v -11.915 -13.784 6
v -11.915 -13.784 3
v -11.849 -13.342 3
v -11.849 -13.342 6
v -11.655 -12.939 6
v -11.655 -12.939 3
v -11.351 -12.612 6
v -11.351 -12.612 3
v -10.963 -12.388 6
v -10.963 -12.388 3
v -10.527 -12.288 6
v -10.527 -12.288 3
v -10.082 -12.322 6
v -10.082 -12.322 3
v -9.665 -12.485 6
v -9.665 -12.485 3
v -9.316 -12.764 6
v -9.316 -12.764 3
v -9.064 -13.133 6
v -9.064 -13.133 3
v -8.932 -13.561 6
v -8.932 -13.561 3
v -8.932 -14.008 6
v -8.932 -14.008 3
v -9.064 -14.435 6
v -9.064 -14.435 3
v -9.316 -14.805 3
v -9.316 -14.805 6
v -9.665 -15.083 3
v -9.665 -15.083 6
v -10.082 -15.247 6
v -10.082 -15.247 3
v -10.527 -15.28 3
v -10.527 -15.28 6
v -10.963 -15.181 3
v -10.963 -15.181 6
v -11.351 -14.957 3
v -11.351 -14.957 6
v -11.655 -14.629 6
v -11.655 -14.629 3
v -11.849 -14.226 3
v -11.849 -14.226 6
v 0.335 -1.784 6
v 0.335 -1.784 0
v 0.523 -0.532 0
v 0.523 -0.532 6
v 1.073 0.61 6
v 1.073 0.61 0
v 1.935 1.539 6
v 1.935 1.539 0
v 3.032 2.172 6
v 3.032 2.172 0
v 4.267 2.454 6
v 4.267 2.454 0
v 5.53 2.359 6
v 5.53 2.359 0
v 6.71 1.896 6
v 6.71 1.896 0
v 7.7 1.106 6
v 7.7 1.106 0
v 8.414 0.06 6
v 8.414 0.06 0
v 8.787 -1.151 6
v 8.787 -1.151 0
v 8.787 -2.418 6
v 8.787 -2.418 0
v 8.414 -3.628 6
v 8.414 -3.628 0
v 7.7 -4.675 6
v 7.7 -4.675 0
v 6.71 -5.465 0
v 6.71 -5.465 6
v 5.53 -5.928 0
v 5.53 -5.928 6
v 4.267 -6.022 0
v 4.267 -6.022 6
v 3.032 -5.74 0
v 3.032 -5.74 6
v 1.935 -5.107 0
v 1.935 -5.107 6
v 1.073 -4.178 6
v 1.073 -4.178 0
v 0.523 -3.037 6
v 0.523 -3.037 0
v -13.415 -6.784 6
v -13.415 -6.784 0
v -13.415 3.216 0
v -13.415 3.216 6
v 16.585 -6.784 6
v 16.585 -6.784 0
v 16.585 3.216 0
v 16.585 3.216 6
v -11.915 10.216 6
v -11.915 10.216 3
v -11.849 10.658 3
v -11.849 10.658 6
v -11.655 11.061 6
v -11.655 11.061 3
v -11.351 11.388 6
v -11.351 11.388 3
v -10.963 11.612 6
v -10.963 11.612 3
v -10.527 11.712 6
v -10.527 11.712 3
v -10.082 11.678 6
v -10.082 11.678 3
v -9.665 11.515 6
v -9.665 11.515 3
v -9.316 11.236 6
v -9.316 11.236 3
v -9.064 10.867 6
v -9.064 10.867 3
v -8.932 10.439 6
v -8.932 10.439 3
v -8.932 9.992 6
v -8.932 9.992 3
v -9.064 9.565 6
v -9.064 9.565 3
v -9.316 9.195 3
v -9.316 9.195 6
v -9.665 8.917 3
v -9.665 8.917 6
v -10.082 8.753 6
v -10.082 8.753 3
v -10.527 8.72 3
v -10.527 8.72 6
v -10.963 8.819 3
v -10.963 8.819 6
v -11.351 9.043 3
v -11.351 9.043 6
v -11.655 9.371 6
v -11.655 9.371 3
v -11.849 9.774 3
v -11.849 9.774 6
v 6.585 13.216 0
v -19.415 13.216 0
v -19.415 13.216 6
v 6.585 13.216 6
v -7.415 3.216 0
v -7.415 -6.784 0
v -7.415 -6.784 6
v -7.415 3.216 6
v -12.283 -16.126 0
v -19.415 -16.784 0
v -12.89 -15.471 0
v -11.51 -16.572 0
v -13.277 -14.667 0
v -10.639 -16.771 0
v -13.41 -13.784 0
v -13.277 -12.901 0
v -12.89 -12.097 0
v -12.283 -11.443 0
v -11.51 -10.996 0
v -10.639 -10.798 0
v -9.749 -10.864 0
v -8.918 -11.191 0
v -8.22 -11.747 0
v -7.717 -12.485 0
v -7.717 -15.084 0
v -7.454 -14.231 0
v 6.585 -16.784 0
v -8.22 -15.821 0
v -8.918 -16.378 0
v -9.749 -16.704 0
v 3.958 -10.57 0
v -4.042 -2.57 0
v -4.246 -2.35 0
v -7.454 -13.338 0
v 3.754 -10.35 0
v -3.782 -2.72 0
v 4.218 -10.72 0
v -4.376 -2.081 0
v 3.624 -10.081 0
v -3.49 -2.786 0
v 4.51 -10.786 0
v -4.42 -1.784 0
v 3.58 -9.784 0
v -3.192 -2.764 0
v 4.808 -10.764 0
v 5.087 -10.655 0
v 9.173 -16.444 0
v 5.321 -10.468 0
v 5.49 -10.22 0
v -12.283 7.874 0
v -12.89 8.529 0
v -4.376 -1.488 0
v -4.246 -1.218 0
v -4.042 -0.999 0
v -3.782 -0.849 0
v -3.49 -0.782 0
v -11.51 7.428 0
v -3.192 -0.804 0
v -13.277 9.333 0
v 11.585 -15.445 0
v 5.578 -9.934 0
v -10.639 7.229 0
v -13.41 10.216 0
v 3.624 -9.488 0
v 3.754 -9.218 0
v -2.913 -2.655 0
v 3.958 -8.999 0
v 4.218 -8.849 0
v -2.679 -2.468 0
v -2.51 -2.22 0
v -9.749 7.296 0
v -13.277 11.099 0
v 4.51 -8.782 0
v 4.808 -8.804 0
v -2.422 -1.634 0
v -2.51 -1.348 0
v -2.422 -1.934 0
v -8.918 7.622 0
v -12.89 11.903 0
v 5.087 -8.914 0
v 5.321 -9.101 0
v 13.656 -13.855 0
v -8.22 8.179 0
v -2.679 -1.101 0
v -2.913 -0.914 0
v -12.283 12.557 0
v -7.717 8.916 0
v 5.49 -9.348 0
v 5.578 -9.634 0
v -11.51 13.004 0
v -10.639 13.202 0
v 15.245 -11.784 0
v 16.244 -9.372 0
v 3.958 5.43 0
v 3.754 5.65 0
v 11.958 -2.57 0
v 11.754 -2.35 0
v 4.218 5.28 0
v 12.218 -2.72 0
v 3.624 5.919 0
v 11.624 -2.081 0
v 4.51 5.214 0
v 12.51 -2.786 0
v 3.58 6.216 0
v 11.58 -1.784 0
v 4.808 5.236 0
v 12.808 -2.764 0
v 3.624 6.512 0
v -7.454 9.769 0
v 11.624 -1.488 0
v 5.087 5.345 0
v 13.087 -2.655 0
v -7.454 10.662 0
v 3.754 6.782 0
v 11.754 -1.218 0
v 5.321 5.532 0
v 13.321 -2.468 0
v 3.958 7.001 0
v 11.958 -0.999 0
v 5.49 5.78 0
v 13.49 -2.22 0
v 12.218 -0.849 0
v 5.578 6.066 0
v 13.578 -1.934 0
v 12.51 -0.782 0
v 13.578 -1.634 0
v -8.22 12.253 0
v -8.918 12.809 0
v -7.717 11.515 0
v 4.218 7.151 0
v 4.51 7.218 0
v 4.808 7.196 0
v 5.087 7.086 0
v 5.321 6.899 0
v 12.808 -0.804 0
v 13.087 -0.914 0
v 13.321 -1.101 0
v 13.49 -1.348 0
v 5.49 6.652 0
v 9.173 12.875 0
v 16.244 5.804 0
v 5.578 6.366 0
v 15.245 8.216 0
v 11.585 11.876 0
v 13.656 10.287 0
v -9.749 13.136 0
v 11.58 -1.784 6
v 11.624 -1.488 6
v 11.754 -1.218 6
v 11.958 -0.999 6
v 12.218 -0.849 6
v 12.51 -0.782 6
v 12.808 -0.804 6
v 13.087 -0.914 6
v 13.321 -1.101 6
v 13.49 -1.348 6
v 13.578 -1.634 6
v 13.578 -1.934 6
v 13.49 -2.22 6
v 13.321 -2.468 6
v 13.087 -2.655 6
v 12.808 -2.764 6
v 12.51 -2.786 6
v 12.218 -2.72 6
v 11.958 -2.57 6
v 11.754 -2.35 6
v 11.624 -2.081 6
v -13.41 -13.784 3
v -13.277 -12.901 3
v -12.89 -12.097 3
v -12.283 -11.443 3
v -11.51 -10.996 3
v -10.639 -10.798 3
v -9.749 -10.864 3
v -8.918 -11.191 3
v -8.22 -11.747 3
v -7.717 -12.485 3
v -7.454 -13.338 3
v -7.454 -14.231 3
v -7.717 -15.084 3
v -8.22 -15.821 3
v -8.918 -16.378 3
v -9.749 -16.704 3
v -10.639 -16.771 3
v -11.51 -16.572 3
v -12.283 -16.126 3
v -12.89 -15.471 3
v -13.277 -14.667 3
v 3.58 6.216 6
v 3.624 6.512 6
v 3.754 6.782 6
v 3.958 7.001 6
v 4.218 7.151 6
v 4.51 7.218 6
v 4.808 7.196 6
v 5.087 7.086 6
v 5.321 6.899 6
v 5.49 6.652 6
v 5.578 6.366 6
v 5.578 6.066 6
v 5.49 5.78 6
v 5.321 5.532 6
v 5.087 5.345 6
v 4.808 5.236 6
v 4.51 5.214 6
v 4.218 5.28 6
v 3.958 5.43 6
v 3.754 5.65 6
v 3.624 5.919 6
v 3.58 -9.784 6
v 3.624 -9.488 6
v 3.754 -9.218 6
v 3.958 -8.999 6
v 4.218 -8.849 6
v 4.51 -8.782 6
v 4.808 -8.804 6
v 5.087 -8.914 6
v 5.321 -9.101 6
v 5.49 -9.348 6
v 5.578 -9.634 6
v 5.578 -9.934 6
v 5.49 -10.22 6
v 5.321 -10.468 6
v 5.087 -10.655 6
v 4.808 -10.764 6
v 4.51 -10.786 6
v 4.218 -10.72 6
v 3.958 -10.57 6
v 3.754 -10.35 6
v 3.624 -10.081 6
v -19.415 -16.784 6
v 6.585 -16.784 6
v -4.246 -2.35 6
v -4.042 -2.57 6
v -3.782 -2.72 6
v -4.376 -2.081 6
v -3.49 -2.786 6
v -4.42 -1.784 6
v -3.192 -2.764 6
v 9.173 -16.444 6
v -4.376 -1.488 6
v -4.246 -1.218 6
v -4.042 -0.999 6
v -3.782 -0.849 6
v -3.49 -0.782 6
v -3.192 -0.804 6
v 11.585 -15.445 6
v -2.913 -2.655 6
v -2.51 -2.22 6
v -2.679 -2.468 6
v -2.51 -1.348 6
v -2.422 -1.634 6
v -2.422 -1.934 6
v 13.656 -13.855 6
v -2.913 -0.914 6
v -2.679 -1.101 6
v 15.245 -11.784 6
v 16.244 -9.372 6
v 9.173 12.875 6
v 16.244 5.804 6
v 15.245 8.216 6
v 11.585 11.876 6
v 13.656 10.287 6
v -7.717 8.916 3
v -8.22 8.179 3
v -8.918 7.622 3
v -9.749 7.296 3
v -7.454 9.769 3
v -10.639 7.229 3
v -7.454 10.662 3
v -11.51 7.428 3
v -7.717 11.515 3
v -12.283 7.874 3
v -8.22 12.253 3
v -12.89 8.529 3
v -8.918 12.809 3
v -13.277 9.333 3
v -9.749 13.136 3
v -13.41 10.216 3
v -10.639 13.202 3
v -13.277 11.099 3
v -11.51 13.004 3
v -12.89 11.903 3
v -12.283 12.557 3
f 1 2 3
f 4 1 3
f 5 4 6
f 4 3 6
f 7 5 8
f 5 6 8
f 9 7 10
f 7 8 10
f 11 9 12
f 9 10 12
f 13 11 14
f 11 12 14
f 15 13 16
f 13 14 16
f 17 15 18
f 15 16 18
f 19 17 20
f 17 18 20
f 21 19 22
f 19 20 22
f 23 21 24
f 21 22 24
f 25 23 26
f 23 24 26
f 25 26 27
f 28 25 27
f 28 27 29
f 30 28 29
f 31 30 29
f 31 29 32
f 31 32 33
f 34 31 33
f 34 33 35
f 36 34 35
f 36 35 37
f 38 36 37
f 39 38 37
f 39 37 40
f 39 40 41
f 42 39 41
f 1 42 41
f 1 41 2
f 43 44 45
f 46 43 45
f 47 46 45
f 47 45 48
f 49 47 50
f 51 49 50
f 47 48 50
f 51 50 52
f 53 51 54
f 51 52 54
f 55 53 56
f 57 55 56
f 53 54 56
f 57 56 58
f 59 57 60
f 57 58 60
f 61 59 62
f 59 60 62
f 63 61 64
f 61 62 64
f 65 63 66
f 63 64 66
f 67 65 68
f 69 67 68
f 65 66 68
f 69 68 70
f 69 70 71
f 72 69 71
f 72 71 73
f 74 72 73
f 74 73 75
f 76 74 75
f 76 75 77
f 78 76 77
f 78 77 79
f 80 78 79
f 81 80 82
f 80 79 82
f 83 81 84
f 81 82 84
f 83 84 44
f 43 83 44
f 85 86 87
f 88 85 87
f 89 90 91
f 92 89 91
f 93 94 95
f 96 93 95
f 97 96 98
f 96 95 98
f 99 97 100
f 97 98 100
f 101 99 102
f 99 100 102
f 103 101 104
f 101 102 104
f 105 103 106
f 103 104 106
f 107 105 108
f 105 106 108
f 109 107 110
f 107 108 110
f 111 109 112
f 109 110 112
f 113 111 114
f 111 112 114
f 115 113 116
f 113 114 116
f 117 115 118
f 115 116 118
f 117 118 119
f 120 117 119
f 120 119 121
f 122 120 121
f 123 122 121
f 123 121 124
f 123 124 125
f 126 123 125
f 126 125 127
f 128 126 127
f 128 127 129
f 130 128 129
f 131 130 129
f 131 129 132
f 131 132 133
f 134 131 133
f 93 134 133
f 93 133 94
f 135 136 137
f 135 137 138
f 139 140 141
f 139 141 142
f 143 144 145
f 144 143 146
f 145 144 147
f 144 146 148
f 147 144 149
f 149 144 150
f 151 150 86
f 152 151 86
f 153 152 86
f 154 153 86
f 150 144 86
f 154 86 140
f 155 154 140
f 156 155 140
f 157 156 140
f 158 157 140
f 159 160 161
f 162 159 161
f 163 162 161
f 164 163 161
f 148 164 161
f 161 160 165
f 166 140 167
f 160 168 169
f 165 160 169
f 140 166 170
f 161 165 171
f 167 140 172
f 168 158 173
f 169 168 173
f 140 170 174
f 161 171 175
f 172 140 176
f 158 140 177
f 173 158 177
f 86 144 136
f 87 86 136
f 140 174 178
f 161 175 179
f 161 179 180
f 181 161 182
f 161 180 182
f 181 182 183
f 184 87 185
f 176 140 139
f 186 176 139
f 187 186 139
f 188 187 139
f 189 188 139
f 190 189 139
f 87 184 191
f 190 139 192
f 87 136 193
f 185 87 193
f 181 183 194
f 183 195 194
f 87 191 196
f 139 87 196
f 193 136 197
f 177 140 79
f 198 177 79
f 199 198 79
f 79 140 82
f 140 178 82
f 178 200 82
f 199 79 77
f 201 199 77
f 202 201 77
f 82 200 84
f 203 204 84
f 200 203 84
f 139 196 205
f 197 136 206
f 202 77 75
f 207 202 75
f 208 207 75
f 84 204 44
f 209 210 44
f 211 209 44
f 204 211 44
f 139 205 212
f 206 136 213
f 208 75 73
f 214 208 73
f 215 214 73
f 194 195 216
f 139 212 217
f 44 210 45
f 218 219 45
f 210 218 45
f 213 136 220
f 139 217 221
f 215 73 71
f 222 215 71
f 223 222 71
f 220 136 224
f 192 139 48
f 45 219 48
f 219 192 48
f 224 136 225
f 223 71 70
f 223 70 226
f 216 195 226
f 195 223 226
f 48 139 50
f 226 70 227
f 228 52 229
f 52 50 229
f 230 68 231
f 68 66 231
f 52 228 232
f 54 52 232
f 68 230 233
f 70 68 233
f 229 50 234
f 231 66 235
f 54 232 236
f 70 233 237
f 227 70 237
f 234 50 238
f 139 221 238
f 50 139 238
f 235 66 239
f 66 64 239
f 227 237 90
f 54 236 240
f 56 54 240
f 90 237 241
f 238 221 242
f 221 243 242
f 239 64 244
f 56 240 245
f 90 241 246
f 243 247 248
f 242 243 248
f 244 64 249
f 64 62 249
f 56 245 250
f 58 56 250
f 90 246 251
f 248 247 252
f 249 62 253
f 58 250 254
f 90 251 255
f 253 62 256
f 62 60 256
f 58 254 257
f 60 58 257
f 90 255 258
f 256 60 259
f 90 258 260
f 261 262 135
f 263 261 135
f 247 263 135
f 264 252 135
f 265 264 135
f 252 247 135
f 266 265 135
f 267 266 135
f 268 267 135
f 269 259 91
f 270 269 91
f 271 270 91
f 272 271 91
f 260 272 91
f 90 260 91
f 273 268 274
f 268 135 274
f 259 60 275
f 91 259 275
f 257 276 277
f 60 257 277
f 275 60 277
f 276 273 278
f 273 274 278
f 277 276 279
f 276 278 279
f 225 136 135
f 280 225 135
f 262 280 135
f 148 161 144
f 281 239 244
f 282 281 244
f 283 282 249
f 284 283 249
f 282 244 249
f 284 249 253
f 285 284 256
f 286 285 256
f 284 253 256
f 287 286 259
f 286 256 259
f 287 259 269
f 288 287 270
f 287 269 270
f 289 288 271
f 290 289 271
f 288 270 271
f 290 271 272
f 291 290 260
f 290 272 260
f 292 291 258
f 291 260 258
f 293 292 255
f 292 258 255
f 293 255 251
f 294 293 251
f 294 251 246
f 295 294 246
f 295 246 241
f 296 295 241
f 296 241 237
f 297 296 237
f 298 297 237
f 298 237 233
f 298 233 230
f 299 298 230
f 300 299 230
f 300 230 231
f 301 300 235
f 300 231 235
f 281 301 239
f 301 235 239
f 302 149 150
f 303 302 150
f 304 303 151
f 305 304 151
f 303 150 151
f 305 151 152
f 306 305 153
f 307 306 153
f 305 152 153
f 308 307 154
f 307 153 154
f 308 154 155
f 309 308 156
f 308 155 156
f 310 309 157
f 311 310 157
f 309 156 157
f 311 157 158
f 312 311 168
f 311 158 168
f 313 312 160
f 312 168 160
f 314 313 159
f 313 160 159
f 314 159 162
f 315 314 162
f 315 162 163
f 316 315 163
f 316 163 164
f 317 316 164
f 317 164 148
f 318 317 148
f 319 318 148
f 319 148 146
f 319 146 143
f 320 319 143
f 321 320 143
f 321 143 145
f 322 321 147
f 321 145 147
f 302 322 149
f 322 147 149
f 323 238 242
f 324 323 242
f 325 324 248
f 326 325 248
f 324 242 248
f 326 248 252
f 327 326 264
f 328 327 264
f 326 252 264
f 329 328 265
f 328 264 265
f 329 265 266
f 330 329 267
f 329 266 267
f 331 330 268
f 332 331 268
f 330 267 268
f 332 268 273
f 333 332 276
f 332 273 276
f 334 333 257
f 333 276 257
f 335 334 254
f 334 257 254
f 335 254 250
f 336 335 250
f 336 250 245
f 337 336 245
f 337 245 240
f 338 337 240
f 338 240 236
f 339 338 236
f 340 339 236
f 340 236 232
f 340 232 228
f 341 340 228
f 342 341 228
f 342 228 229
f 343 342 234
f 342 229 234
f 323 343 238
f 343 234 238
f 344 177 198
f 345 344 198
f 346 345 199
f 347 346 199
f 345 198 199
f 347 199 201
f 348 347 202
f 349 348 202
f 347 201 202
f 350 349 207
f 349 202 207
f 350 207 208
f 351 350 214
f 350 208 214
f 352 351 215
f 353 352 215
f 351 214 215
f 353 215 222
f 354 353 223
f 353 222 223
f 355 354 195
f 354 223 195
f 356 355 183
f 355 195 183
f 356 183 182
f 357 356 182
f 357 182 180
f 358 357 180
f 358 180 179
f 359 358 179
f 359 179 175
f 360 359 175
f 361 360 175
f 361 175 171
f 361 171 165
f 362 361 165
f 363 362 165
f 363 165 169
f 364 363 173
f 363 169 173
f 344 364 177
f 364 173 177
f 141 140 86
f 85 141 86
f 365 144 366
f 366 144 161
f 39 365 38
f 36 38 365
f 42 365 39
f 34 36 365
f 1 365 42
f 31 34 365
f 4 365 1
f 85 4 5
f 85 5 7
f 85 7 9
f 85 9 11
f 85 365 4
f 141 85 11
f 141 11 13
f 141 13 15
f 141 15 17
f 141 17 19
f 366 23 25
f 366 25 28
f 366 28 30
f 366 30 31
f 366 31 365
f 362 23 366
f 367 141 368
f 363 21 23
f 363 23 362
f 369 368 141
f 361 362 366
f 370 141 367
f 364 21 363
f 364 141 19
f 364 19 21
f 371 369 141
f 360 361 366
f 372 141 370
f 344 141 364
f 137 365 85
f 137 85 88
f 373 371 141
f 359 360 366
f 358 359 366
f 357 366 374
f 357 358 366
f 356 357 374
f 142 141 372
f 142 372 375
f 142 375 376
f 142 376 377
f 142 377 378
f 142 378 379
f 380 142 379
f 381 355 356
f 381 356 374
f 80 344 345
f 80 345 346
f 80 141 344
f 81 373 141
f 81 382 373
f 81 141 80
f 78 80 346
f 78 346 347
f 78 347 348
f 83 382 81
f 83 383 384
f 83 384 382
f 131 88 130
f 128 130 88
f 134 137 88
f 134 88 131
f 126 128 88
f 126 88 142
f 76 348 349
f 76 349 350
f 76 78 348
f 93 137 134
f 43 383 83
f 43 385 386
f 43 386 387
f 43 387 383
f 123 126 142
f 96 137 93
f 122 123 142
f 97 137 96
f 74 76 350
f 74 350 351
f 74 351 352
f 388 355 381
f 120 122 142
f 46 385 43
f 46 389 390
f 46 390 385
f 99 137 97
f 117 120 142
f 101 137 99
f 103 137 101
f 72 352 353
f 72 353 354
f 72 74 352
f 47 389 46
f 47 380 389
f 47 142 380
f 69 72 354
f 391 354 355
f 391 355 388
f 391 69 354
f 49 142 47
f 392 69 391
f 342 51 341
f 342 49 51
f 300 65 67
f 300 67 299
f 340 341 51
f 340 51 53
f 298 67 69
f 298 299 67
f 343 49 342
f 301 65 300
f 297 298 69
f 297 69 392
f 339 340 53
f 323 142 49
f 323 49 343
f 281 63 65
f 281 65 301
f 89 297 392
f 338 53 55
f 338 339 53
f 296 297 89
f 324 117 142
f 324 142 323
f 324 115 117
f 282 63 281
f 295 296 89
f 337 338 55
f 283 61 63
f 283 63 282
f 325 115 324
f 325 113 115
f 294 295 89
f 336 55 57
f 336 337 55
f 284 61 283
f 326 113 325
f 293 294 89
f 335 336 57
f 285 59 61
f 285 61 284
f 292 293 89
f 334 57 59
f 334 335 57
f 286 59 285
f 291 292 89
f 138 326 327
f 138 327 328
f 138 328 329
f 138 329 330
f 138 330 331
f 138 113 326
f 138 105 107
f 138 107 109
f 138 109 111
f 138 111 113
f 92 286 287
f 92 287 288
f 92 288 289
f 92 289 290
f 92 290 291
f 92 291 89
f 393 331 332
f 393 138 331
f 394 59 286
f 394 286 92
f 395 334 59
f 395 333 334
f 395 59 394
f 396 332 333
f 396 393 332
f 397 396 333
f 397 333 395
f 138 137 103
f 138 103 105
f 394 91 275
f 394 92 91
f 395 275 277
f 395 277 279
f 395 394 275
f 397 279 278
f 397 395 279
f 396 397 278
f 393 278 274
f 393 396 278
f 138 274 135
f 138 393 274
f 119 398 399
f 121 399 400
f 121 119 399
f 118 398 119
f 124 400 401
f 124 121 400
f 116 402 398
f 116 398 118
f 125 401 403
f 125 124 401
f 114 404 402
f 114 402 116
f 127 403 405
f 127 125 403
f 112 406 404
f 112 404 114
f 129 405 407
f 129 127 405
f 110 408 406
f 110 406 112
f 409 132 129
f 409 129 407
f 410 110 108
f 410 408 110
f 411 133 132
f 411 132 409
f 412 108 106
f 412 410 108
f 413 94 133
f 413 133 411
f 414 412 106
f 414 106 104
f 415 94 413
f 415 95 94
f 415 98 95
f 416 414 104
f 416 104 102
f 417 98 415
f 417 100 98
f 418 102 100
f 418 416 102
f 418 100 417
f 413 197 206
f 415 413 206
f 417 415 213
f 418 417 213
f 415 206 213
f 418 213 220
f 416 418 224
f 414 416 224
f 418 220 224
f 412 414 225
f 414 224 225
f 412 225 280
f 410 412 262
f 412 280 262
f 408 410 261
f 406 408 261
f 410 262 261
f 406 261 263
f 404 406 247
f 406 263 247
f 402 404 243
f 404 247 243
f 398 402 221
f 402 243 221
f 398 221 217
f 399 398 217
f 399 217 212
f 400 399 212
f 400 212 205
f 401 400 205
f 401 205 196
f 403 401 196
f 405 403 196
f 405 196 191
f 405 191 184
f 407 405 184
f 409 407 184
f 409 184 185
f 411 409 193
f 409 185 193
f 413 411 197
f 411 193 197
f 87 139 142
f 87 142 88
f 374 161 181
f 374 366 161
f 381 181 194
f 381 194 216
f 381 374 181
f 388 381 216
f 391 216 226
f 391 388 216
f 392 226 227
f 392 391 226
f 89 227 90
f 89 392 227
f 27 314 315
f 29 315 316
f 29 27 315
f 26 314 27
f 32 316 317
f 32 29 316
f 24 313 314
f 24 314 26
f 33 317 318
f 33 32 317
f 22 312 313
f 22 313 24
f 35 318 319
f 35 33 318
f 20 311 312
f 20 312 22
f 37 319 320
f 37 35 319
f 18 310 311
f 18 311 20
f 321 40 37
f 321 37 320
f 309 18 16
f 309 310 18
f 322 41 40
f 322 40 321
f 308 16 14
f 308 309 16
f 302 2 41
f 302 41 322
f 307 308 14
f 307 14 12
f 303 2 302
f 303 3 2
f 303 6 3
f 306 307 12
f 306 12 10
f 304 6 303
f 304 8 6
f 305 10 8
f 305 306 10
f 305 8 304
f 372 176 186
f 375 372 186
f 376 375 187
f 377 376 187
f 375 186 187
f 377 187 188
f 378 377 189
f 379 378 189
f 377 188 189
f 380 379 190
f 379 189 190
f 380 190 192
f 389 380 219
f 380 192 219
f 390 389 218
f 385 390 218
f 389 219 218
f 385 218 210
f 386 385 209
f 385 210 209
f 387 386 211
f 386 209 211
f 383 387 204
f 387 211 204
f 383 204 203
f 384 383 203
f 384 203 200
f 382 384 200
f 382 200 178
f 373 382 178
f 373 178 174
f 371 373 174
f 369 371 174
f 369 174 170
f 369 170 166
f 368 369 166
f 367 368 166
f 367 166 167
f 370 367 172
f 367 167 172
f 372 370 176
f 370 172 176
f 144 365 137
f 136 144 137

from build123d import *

# Parameters (mm, degrees)
ESQUISSE1_W             = 50
ESQUISSE1_H             = 30
BOSS_EXTRU_1_DEPTH      = 6
ESQUISSE4_W             = 5
ESQUISSE4_H             = 30
ENL_V_MAT_EXTRU_2_DEPTH = 6
ESQUISSE6_R             = 1.5
ENL_V_MAT_EXTRU_3_DEPTH = 6
ESQUISSE7_R             = 2.995
ENL_V_MAT_EXTRU_4_DEPTH = 3
ESQUISSE8_W             = 6
ESQUISSE8_H             = 10
ENL_V_MAT_EXTRU_5_DEPTH = 6
ESQUISSE10_R            = 1.005
ENL_V_MAT_EXTRU_6_DEPTH = 6
ESQUISSE11_R            = 4.25
ENL_V_MAT_EXTRU_7_DEPTH = 6
ESQUISSE12_W            = 9
ESQUISSE12_H            = 30
ENL_V_MAT_EXTRU_8_DEPTH = 6
CONG_1_R                = 10


with BuildPart() as part:
    # Esquisse1 → Boss.-Extru.1 (new body)
    with BuildSketch(Plane.XY):
        with Locations((0.584677419, -1.784274194)):
            Rectangle(ESQUISSE1_W, ESQUISSE1_H)
    extrude(amount=BOSS_EXTRU_1_DEPTH)

    # Esquisse4 → Enlèv. mat.-Extru.2 (cut)
    with BuildSketch(Plane.XY.offset(6)):
        with Locations((-21.915322581, -1.784274194)):
            Rectangle(ESQUISSE4_W, ESQUISSE4_H)
    extrude(amount=-ENL_V_MAT_EXTRU_2_DEPTH, mode=Mode.SUBTRACT)

    # Esquisse6 → Enlèv. mat.-Extru.3 (cut)
    with BuildSketch(Plane(origin=(0, 0, 0), x_dir=(-1, 0, 0), z_dir=(0, 0, -1))):
        with Locations((10.415322581, 10.215725806)):
            Circle(ESQUISSE6_R)
        with Locations((10.415322581, -13.784274194)):
            Circle(ESQUISSE6_R)
    extrude(amount=-ENL_V_MAT_EXTRU_3_DEPTH, mode=Mode.SUBTRACT)

    # Esquisse7 → Enlèv. mat.-Extru.4 (cut)
    with BuildSketch(Plane(origin=(0, 0, 0), x_dir=(-1, 0, 0), z_dir=(0, 0, -1))):
        with Locations((10.415322581, -13.784274194)):
            Circle(ESQUISSE7_R)
        with Locations((10.415322581, 10.215725806)):
            Circle(ESQUISSE7_R)
    extrude(amount=-ENL_V_MAT_EXTRU_4_DEPTH, mode=Mode.SUBTRACT)

    # Esquisse8 → Enlèv. mat.-Extru.5 (cut)
    with BuildSketch(Plane(origin=(0, 0, 0), x_dir=(-1, 0, 0), z_dir=(0, 0, -1))):
        with Locations((10.415322581, -1.784274194)):
            Rectangle(ESQUISSE8_W, ESQUISSE8_H)
    extrude(amount=-ENL_V_MAT_EXTRU_5_DEPTH, mode=Mode.SUBTRACT)

    # Esquisse10 → Enlèv. mat.-Extru.6 (cut)
    with BuildSketch(Plane(origin=(0, 0, 0), x_dir=(-1, 0, 0), z_dir=(0, 0, -1))):
        with Locations((-4.584677419, 6.215725806)):
            Circle(ESQUISSE10_R)
        with Locations((-12.584677419, -1.784274194)):
            Circle(ESQUISSE10_R)
        with Locations((3.415322581, -1.784274194)):
            Circle(ESQUISSE10_R)
        with Locations((-4.584677419, -9.784274194)):
            Circle(ESQUISSE10_R)
    extrude(amount=-ENL_V_MAT_EXTRU_6_DEPTH, mode=Mode.SUBTRACT)

    # Esquisse11 → Enlèv. mat.-Extru.7 (cut)
    with BuildSketch(Plane(origin=(0, 0, 0), x_dir=(-1, 0, 0), z_dir=(0, 0, -1))):
        with Locations((-4.584677419, -1.784274194)):
            Circle(ESQUISSE11_R)
    extrude(amount=-ENL_V_MAT_EXTRU_7_DEPTH, mode=Mode.SUBTRACT)

    # Esquisse12 → Enlèv. mat.-Extru.8 (cut)
    with BuildSketch(Plane(origin=(0, 0, 0), x_dir=(-1, 0, 0), z_dir=(0, 0, -1))):
        with Locations((-21.084677419, -1.784274194)):
            Rectangle(ESQUISSE12_W, ESQUISSE12_H)
    extrude(amount=-ENL_V_MAT_EXTRU_8_DEPTH, mode=Mode.SUBTRACT)

    # Congé1
    cong_1_edges = [part.edges().sort_by_distance(p)[0] for p in [
        (16.584677419, 13.215725806, 3),
        (16.584677419, -16.784274194, 3),
    ]]
    fillet(cong_1_edges, radius=CONG_1_R)


solid = part.part
